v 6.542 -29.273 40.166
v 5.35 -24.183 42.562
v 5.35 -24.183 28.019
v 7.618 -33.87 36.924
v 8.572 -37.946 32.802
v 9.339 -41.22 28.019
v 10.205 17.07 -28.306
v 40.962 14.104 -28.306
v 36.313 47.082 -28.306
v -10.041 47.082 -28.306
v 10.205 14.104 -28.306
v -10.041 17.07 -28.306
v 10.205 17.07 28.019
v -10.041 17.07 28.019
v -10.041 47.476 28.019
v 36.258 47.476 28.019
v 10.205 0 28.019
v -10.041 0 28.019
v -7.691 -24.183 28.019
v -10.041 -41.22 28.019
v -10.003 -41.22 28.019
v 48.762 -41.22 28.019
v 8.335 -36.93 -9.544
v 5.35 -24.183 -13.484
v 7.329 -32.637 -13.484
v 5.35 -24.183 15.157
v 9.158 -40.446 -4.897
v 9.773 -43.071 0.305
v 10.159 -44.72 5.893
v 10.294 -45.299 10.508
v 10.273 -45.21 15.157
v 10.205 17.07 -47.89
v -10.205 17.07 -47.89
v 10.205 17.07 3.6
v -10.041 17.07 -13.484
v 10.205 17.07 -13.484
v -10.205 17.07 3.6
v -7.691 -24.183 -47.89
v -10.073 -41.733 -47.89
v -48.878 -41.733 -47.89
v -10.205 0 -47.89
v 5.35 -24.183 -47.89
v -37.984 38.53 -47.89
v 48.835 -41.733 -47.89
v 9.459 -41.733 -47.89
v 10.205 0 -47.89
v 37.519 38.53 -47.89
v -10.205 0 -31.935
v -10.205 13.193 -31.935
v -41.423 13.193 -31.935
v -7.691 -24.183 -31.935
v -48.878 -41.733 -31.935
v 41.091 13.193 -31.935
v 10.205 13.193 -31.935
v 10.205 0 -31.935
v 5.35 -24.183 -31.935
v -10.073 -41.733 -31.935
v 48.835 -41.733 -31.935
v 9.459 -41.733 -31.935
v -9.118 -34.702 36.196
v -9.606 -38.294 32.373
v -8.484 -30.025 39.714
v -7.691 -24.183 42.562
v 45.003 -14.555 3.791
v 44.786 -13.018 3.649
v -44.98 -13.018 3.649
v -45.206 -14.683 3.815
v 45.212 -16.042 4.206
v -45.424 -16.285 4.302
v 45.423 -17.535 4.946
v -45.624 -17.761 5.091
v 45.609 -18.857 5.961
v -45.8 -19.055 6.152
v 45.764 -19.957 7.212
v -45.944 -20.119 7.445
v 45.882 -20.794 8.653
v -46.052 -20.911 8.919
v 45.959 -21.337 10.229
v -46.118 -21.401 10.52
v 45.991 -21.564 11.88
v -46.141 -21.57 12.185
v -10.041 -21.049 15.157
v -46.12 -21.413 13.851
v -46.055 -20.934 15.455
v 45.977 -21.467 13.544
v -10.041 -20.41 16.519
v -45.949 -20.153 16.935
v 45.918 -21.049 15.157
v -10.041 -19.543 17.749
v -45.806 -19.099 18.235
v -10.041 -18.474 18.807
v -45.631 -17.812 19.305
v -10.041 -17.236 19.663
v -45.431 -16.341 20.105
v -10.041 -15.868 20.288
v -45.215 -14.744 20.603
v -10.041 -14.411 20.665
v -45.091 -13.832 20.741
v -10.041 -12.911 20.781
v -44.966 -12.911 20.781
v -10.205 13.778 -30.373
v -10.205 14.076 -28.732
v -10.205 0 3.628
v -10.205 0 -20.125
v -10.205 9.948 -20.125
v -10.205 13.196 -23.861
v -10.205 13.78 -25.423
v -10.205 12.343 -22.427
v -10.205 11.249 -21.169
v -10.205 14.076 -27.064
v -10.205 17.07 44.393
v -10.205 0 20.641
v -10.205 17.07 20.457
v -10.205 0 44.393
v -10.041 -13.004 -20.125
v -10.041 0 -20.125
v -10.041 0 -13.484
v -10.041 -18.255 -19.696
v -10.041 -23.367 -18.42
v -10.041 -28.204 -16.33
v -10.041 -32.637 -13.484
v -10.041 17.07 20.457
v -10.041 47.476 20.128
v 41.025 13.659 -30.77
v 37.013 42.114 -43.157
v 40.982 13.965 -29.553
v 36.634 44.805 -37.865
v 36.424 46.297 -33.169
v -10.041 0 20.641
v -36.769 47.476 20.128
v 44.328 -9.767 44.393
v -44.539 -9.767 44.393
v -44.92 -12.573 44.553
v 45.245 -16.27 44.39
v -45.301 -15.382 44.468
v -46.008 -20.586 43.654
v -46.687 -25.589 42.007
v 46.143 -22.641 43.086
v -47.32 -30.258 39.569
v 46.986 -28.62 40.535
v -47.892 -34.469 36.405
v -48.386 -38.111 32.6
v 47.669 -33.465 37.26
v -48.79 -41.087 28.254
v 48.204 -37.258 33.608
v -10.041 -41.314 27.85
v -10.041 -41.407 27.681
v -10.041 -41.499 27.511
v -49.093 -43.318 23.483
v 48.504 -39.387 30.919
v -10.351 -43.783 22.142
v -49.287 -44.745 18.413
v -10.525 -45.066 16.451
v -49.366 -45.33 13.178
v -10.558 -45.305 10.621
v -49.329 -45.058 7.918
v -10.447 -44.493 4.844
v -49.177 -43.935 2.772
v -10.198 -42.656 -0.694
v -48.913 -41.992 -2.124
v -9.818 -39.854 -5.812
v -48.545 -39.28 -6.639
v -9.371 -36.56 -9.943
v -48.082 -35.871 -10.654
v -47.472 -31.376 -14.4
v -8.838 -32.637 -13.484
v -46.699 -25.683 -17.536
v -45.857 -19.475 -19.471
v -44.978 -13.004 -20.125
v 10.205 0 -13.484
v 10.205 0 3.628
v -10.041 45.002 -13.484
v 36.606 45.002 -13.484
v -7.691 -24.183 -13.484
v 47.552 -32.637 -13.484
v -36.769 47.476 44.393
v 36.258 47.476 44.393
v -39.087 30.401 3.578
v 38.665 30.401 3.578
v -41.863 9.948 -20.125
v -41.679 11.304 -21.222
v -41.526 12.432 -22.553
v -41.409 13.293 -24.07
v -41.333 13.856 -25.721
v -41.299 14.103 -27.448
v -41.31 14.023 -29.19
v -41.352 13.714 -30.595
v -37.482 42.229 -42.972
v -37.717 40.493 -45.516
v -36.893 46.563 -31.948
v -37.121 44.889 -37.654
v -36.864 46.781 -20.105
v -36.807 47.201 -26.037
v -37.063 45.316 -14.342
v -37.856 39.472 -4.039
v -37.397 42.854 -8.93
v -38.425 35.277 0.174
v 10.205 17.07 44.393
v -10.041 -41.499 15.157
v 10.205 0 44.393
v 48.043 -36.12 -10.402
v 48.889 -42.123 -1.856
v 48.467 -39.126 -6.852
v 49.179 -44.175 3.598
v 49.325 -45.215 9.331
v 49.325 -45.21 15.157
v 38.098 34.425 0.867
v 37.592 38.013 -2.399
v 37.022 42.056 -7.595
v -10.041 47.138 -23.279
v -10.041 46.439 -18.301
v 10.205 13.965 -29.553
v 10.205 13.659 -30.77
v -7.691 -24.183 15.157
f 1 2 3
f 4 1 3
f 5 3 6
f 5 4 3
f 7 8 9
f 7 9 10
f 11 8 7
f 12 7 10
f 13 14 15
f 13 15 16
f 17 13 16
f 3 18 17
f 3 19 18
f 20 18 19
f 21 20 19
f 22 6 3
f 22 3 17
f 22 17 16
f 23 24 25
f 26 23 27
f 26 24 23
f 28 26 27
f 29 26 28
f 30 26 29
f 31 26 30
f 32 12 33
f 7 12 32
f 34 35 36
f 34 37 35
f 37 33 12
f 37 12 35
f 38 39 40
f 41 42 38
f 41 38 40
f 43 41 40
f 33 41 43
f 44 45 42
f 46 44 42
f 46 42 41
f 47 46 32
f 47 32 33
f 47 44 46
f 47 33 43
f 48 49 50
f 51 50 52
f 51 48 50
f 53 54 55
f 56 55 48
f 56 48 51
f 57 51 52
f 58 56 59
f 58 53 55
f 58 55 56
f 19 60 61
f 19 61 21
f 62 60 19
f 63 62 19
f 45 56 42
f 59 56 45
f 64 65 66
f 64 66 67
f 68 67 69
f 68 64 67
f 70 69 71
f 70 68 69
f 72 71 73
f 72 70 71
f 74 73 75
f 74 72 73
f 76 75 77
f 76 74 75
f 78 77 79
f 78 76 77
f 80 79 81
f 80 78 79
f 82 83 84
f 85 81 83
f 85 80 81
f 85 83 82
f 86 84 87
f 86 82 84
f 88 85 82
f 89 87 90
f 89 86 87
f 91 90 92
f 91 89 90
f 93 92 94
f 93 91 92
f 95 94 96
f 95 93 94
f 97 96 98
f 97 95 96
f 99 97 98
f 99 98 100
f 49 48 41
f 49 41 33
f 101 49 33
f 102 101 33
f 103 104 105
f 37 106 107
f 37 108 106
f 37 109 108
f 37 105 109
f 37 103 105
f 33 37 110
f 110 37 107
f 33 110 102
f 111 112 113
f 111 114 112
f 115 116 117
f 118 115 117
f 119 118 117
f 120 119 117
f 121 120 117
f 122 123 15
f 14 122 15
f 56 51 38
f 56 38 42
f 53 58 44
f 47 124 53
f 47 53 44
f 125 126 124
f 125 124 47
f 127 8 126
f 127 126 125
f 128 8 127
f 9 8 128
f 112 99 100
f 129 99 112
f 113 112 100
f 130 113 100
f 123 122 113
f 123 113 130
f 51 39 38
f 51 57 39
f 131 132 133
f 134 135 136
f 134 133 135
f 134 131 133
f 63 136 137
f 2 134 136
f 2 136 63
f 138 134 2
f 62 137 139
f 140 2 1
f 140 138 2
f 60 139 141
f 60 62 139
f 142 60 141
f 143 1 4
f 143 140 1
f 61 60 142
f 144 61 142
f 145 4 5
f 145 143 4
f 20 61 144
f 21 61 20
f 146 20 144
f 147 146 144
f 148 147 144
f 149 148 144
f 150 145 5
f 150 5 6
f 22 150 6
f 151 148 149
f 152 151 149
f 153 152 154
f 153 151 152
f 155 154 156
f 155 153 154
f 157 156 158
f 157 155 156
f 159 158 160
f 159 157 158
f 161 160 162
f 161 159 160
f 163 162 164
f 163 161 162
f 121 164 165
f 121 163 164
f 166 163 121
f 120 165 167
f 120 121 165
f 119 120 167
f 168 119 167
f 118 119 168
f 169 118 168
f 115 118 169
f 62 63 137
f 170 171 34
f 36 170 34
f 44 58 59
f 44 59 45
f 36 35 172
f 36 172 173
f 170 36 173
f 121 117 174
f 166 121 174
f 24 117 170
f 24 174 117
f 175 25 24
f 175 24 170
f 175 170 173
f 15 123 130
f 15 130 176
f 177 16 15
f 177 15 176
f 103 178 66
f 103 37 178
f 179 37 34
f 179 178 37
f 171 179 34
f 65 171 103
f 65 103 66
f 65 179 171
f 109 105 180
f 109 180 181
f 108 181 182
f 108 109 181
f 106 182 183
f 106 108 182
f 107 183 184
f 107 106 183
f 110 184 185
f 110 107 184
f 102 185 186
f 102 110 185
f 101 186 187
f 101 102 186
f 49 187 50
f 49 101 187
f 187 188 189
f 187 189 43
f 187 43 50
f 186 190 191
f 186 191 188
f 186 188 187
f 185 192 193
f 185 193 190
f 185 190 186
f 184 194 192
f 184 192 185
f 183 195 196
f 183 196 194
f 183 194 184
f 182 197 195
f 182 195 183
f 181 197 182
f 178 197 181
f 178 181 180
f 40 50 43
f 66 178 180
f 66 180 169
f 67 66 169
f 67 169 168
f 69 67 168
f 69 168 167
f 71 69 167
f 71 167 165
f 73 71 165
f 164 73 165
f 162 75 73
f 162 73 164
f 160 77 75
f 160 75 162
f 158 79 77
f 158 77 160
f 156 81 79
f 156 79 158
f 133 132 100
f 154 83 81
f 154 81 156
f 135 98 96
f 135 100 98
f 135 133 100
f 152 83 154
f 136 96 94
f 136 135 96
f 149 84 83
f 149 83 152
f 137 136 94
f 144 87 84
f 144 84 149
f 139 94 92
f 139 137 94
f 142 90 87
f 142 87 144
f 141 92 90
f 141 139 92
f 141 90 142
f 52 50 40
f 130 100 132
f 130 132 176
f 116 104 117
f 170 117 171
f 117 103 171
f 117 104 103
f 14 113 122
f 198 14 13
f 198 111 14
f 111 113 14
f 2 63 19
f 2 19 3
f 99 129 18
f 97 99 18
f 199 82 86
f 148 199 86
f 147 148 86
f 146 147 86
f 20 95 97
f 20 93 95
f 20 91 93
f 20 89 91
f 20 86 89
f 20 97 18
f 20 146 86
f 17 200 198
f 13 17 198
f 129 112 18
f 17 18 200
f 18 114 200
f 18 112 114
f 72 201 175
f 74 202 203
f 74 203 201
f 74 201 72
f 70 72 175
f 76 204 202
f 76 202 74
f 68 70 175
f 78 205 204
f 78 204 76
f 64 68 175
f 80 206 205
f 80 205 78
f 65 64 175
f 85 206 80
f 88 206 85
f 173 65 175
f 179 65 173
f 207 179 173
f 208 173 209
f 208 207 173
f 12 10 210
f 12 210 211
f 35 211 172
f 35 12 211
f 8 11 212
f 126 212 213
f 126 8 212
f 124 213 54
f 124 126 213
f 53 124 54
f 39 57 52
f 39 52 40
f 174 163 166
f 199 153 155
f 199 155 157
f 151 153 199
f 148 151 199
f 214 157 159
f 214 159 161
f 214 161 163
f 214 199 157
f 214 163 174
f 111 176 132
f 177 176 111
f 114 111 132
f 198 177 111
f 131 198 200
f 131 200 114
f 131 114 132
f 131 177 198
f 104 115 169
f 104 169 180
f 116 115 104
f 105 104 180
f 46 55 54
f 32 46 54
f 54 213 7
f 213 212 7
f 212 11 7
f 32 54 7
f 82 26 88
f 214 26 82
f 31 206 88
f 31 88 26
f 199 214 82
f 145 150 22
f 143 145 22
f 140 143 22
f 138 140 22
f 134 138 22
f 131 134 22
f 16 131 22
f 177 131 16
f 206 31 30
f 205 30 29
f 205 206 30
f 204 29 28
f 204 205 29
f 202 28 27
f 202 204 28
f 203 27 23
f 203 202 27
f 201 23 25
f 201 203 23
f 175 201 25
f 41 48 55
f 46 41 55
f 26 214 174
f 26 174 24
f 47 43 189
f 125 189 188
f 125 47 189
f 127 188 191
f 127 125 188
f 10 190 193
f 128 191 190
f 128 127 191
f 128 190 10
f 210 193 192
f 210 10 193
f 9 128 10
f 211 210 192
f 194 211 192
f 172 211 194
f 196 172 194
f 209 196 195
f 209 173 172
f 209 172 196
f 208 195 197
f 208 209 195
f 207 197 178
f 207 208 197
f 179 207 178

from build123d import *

# Parameters (mm, degrees)
F0_W     = 20.4098373652
F0_H     = 17.0696731657
F3_DEPTH = 50
F1_W     = 39.9590164423
F1_H     = 21.9808734953
F1_H_2   = 12.8620229661
F1_W_2   = 10.0409835577
F1_H_3   = 15.1571035385
F1_W_3   = 50
F1_H_4   = 13.4836062789
F1_H_5   = 14.8224066943
F1_H_6   = 21.6939870268
F4_DEPTH = 50
F5_DEPTH = 50


with BuildPart() as f3:
    # F0 (on Top) → F3 (new body, symmetric)
    with BuildSketch(Plane.XY):
        Polygon((-36.4268427715, 50), (-50, -50), (-11.1948736012, -50), (-7.6906718126, -24.1828542203), (5.3497580811, -24.1828542203), (11.394909583, -50), (50, -50), (35.9016373754, 50), align=None)
        with Locations((0, 8.5348365828)):
            Rectangle(F0_W, F0_H, mode=Mode.SUBTRACT)
    extrude(amount=F3_DEPTH, both=True)

    # F1 (on Front) → F4 (intersect, symmetric)
    with BuildSketch(Plane.XZ):
        with Locations((-30.0204917789, 39.0095632523)):
            Rectangle(F1_W, F1_H)
        with Locations((-30.0204917789, 21.5881150216)):
            Rectangle(F1_W, F1_H_2)
        with Locations((-5.0204917789, 39.0095632523)):
            Rectangle(F1_W_2, F1_H)
        with Locations((-30.0204917789, 7.5785517693)):
            Rectangle(F1_W, F1_H_3)
        with Locations((25, 39.0095632523)):
            Rectangle(F1_W_3, F1_H)
        with Locations((-30.0204917789, -6.7418031394)):
            Rectangle(F1_W, F1_H_4)
        with Locations((-5.0204917789, 7.5785517693)):
            Rectangle(F1_W_2, F1_H_3)
        with Locations((-30.0204917789, -20.894809626)):
            Rectangle(F1_W, F1_H_5)
        with Locations((-5.0204917789, -6.7418031394)):
            Rectangle(F1_W_2, F1_H_4)
        with Locations((25, 7.5785517693)):
            Rectangle(F1_W_3, F1_H_3)
        Polygon((-10.0409835577, -28.3060129732), (-50, -28.3060129732), (-50, -50), (0, -50), (0, -28.3060129732), align=None)
        with Locations((25, -6.7418031394)):
            Rectangle(F1_W_3, F1_H_4)
        with Locations((25, -39.1530064866)):
            Rectangle(F1_W_3, F1_H_6)
    extrude(amount=F4_DEPTH, both=True, mode=Mode.INTERSECT)

    # F2 (on Right) → F5 (intersect, symmetric)
    with BuildSketch(Plane.YZ):
        with BuildLine():
            ThreePointArc((-13.0180147375, 3.6492112836), (-21.5699932759, 12.268680348), (-12.9113338643, 20.780977398))
            Line((-12.9113338643, 20.780977398), (47.4755875766, 20.1275501))
            Line((47.4755875766, 20.1275501), (47.4755875766, 44.3933308125))
            Line((47.4755875766, 44.3933308125), (-9.7670806572, 44.3933308125))
            ThreePointArc((-9.7670806572, 44.3933308125), (-45.3037856876, 13.8358446009), (-13.0040198565, -20.1250519603))
            Line((-13.0040198565, -20.1250519603), (9.9475071912, -20.1250519603))
            ThreePointArc((9.9475071912, -20.1250519603), (13.7797693487, -25.4229853105), (13.1929796225, -31.9352820516))
            Line((13.1929796225, -31.9352820516), (9.74121131, -31.9352820516))
            Line((9.74121131, -31.9352820516), (-41.7333990335, -31.9352820516))
            Line((-41.7333990335, -31.9352820516), (-41.7333990335, -47.8897877038))
            Line((-41.7333990335, -47.8897877038), (33.7939150631, -47.8897877038))
            Line((33.7939150631, -47.8897877038), (38.5303236544, -47.8897877038))
            ThreePointArc((38.5303236544, -47.8897877038), (46.7972185844, -20.2080841435), (30.4012625826, 3.5782751947))
            Line((30.4012625826, 3.5782751947), (-13.0180147375, 3.6492112836))
        make_face()
    extrude(amount=F5_DEPTH, both=True, mode=Mode.INTERSECT)


solid = f3.part
